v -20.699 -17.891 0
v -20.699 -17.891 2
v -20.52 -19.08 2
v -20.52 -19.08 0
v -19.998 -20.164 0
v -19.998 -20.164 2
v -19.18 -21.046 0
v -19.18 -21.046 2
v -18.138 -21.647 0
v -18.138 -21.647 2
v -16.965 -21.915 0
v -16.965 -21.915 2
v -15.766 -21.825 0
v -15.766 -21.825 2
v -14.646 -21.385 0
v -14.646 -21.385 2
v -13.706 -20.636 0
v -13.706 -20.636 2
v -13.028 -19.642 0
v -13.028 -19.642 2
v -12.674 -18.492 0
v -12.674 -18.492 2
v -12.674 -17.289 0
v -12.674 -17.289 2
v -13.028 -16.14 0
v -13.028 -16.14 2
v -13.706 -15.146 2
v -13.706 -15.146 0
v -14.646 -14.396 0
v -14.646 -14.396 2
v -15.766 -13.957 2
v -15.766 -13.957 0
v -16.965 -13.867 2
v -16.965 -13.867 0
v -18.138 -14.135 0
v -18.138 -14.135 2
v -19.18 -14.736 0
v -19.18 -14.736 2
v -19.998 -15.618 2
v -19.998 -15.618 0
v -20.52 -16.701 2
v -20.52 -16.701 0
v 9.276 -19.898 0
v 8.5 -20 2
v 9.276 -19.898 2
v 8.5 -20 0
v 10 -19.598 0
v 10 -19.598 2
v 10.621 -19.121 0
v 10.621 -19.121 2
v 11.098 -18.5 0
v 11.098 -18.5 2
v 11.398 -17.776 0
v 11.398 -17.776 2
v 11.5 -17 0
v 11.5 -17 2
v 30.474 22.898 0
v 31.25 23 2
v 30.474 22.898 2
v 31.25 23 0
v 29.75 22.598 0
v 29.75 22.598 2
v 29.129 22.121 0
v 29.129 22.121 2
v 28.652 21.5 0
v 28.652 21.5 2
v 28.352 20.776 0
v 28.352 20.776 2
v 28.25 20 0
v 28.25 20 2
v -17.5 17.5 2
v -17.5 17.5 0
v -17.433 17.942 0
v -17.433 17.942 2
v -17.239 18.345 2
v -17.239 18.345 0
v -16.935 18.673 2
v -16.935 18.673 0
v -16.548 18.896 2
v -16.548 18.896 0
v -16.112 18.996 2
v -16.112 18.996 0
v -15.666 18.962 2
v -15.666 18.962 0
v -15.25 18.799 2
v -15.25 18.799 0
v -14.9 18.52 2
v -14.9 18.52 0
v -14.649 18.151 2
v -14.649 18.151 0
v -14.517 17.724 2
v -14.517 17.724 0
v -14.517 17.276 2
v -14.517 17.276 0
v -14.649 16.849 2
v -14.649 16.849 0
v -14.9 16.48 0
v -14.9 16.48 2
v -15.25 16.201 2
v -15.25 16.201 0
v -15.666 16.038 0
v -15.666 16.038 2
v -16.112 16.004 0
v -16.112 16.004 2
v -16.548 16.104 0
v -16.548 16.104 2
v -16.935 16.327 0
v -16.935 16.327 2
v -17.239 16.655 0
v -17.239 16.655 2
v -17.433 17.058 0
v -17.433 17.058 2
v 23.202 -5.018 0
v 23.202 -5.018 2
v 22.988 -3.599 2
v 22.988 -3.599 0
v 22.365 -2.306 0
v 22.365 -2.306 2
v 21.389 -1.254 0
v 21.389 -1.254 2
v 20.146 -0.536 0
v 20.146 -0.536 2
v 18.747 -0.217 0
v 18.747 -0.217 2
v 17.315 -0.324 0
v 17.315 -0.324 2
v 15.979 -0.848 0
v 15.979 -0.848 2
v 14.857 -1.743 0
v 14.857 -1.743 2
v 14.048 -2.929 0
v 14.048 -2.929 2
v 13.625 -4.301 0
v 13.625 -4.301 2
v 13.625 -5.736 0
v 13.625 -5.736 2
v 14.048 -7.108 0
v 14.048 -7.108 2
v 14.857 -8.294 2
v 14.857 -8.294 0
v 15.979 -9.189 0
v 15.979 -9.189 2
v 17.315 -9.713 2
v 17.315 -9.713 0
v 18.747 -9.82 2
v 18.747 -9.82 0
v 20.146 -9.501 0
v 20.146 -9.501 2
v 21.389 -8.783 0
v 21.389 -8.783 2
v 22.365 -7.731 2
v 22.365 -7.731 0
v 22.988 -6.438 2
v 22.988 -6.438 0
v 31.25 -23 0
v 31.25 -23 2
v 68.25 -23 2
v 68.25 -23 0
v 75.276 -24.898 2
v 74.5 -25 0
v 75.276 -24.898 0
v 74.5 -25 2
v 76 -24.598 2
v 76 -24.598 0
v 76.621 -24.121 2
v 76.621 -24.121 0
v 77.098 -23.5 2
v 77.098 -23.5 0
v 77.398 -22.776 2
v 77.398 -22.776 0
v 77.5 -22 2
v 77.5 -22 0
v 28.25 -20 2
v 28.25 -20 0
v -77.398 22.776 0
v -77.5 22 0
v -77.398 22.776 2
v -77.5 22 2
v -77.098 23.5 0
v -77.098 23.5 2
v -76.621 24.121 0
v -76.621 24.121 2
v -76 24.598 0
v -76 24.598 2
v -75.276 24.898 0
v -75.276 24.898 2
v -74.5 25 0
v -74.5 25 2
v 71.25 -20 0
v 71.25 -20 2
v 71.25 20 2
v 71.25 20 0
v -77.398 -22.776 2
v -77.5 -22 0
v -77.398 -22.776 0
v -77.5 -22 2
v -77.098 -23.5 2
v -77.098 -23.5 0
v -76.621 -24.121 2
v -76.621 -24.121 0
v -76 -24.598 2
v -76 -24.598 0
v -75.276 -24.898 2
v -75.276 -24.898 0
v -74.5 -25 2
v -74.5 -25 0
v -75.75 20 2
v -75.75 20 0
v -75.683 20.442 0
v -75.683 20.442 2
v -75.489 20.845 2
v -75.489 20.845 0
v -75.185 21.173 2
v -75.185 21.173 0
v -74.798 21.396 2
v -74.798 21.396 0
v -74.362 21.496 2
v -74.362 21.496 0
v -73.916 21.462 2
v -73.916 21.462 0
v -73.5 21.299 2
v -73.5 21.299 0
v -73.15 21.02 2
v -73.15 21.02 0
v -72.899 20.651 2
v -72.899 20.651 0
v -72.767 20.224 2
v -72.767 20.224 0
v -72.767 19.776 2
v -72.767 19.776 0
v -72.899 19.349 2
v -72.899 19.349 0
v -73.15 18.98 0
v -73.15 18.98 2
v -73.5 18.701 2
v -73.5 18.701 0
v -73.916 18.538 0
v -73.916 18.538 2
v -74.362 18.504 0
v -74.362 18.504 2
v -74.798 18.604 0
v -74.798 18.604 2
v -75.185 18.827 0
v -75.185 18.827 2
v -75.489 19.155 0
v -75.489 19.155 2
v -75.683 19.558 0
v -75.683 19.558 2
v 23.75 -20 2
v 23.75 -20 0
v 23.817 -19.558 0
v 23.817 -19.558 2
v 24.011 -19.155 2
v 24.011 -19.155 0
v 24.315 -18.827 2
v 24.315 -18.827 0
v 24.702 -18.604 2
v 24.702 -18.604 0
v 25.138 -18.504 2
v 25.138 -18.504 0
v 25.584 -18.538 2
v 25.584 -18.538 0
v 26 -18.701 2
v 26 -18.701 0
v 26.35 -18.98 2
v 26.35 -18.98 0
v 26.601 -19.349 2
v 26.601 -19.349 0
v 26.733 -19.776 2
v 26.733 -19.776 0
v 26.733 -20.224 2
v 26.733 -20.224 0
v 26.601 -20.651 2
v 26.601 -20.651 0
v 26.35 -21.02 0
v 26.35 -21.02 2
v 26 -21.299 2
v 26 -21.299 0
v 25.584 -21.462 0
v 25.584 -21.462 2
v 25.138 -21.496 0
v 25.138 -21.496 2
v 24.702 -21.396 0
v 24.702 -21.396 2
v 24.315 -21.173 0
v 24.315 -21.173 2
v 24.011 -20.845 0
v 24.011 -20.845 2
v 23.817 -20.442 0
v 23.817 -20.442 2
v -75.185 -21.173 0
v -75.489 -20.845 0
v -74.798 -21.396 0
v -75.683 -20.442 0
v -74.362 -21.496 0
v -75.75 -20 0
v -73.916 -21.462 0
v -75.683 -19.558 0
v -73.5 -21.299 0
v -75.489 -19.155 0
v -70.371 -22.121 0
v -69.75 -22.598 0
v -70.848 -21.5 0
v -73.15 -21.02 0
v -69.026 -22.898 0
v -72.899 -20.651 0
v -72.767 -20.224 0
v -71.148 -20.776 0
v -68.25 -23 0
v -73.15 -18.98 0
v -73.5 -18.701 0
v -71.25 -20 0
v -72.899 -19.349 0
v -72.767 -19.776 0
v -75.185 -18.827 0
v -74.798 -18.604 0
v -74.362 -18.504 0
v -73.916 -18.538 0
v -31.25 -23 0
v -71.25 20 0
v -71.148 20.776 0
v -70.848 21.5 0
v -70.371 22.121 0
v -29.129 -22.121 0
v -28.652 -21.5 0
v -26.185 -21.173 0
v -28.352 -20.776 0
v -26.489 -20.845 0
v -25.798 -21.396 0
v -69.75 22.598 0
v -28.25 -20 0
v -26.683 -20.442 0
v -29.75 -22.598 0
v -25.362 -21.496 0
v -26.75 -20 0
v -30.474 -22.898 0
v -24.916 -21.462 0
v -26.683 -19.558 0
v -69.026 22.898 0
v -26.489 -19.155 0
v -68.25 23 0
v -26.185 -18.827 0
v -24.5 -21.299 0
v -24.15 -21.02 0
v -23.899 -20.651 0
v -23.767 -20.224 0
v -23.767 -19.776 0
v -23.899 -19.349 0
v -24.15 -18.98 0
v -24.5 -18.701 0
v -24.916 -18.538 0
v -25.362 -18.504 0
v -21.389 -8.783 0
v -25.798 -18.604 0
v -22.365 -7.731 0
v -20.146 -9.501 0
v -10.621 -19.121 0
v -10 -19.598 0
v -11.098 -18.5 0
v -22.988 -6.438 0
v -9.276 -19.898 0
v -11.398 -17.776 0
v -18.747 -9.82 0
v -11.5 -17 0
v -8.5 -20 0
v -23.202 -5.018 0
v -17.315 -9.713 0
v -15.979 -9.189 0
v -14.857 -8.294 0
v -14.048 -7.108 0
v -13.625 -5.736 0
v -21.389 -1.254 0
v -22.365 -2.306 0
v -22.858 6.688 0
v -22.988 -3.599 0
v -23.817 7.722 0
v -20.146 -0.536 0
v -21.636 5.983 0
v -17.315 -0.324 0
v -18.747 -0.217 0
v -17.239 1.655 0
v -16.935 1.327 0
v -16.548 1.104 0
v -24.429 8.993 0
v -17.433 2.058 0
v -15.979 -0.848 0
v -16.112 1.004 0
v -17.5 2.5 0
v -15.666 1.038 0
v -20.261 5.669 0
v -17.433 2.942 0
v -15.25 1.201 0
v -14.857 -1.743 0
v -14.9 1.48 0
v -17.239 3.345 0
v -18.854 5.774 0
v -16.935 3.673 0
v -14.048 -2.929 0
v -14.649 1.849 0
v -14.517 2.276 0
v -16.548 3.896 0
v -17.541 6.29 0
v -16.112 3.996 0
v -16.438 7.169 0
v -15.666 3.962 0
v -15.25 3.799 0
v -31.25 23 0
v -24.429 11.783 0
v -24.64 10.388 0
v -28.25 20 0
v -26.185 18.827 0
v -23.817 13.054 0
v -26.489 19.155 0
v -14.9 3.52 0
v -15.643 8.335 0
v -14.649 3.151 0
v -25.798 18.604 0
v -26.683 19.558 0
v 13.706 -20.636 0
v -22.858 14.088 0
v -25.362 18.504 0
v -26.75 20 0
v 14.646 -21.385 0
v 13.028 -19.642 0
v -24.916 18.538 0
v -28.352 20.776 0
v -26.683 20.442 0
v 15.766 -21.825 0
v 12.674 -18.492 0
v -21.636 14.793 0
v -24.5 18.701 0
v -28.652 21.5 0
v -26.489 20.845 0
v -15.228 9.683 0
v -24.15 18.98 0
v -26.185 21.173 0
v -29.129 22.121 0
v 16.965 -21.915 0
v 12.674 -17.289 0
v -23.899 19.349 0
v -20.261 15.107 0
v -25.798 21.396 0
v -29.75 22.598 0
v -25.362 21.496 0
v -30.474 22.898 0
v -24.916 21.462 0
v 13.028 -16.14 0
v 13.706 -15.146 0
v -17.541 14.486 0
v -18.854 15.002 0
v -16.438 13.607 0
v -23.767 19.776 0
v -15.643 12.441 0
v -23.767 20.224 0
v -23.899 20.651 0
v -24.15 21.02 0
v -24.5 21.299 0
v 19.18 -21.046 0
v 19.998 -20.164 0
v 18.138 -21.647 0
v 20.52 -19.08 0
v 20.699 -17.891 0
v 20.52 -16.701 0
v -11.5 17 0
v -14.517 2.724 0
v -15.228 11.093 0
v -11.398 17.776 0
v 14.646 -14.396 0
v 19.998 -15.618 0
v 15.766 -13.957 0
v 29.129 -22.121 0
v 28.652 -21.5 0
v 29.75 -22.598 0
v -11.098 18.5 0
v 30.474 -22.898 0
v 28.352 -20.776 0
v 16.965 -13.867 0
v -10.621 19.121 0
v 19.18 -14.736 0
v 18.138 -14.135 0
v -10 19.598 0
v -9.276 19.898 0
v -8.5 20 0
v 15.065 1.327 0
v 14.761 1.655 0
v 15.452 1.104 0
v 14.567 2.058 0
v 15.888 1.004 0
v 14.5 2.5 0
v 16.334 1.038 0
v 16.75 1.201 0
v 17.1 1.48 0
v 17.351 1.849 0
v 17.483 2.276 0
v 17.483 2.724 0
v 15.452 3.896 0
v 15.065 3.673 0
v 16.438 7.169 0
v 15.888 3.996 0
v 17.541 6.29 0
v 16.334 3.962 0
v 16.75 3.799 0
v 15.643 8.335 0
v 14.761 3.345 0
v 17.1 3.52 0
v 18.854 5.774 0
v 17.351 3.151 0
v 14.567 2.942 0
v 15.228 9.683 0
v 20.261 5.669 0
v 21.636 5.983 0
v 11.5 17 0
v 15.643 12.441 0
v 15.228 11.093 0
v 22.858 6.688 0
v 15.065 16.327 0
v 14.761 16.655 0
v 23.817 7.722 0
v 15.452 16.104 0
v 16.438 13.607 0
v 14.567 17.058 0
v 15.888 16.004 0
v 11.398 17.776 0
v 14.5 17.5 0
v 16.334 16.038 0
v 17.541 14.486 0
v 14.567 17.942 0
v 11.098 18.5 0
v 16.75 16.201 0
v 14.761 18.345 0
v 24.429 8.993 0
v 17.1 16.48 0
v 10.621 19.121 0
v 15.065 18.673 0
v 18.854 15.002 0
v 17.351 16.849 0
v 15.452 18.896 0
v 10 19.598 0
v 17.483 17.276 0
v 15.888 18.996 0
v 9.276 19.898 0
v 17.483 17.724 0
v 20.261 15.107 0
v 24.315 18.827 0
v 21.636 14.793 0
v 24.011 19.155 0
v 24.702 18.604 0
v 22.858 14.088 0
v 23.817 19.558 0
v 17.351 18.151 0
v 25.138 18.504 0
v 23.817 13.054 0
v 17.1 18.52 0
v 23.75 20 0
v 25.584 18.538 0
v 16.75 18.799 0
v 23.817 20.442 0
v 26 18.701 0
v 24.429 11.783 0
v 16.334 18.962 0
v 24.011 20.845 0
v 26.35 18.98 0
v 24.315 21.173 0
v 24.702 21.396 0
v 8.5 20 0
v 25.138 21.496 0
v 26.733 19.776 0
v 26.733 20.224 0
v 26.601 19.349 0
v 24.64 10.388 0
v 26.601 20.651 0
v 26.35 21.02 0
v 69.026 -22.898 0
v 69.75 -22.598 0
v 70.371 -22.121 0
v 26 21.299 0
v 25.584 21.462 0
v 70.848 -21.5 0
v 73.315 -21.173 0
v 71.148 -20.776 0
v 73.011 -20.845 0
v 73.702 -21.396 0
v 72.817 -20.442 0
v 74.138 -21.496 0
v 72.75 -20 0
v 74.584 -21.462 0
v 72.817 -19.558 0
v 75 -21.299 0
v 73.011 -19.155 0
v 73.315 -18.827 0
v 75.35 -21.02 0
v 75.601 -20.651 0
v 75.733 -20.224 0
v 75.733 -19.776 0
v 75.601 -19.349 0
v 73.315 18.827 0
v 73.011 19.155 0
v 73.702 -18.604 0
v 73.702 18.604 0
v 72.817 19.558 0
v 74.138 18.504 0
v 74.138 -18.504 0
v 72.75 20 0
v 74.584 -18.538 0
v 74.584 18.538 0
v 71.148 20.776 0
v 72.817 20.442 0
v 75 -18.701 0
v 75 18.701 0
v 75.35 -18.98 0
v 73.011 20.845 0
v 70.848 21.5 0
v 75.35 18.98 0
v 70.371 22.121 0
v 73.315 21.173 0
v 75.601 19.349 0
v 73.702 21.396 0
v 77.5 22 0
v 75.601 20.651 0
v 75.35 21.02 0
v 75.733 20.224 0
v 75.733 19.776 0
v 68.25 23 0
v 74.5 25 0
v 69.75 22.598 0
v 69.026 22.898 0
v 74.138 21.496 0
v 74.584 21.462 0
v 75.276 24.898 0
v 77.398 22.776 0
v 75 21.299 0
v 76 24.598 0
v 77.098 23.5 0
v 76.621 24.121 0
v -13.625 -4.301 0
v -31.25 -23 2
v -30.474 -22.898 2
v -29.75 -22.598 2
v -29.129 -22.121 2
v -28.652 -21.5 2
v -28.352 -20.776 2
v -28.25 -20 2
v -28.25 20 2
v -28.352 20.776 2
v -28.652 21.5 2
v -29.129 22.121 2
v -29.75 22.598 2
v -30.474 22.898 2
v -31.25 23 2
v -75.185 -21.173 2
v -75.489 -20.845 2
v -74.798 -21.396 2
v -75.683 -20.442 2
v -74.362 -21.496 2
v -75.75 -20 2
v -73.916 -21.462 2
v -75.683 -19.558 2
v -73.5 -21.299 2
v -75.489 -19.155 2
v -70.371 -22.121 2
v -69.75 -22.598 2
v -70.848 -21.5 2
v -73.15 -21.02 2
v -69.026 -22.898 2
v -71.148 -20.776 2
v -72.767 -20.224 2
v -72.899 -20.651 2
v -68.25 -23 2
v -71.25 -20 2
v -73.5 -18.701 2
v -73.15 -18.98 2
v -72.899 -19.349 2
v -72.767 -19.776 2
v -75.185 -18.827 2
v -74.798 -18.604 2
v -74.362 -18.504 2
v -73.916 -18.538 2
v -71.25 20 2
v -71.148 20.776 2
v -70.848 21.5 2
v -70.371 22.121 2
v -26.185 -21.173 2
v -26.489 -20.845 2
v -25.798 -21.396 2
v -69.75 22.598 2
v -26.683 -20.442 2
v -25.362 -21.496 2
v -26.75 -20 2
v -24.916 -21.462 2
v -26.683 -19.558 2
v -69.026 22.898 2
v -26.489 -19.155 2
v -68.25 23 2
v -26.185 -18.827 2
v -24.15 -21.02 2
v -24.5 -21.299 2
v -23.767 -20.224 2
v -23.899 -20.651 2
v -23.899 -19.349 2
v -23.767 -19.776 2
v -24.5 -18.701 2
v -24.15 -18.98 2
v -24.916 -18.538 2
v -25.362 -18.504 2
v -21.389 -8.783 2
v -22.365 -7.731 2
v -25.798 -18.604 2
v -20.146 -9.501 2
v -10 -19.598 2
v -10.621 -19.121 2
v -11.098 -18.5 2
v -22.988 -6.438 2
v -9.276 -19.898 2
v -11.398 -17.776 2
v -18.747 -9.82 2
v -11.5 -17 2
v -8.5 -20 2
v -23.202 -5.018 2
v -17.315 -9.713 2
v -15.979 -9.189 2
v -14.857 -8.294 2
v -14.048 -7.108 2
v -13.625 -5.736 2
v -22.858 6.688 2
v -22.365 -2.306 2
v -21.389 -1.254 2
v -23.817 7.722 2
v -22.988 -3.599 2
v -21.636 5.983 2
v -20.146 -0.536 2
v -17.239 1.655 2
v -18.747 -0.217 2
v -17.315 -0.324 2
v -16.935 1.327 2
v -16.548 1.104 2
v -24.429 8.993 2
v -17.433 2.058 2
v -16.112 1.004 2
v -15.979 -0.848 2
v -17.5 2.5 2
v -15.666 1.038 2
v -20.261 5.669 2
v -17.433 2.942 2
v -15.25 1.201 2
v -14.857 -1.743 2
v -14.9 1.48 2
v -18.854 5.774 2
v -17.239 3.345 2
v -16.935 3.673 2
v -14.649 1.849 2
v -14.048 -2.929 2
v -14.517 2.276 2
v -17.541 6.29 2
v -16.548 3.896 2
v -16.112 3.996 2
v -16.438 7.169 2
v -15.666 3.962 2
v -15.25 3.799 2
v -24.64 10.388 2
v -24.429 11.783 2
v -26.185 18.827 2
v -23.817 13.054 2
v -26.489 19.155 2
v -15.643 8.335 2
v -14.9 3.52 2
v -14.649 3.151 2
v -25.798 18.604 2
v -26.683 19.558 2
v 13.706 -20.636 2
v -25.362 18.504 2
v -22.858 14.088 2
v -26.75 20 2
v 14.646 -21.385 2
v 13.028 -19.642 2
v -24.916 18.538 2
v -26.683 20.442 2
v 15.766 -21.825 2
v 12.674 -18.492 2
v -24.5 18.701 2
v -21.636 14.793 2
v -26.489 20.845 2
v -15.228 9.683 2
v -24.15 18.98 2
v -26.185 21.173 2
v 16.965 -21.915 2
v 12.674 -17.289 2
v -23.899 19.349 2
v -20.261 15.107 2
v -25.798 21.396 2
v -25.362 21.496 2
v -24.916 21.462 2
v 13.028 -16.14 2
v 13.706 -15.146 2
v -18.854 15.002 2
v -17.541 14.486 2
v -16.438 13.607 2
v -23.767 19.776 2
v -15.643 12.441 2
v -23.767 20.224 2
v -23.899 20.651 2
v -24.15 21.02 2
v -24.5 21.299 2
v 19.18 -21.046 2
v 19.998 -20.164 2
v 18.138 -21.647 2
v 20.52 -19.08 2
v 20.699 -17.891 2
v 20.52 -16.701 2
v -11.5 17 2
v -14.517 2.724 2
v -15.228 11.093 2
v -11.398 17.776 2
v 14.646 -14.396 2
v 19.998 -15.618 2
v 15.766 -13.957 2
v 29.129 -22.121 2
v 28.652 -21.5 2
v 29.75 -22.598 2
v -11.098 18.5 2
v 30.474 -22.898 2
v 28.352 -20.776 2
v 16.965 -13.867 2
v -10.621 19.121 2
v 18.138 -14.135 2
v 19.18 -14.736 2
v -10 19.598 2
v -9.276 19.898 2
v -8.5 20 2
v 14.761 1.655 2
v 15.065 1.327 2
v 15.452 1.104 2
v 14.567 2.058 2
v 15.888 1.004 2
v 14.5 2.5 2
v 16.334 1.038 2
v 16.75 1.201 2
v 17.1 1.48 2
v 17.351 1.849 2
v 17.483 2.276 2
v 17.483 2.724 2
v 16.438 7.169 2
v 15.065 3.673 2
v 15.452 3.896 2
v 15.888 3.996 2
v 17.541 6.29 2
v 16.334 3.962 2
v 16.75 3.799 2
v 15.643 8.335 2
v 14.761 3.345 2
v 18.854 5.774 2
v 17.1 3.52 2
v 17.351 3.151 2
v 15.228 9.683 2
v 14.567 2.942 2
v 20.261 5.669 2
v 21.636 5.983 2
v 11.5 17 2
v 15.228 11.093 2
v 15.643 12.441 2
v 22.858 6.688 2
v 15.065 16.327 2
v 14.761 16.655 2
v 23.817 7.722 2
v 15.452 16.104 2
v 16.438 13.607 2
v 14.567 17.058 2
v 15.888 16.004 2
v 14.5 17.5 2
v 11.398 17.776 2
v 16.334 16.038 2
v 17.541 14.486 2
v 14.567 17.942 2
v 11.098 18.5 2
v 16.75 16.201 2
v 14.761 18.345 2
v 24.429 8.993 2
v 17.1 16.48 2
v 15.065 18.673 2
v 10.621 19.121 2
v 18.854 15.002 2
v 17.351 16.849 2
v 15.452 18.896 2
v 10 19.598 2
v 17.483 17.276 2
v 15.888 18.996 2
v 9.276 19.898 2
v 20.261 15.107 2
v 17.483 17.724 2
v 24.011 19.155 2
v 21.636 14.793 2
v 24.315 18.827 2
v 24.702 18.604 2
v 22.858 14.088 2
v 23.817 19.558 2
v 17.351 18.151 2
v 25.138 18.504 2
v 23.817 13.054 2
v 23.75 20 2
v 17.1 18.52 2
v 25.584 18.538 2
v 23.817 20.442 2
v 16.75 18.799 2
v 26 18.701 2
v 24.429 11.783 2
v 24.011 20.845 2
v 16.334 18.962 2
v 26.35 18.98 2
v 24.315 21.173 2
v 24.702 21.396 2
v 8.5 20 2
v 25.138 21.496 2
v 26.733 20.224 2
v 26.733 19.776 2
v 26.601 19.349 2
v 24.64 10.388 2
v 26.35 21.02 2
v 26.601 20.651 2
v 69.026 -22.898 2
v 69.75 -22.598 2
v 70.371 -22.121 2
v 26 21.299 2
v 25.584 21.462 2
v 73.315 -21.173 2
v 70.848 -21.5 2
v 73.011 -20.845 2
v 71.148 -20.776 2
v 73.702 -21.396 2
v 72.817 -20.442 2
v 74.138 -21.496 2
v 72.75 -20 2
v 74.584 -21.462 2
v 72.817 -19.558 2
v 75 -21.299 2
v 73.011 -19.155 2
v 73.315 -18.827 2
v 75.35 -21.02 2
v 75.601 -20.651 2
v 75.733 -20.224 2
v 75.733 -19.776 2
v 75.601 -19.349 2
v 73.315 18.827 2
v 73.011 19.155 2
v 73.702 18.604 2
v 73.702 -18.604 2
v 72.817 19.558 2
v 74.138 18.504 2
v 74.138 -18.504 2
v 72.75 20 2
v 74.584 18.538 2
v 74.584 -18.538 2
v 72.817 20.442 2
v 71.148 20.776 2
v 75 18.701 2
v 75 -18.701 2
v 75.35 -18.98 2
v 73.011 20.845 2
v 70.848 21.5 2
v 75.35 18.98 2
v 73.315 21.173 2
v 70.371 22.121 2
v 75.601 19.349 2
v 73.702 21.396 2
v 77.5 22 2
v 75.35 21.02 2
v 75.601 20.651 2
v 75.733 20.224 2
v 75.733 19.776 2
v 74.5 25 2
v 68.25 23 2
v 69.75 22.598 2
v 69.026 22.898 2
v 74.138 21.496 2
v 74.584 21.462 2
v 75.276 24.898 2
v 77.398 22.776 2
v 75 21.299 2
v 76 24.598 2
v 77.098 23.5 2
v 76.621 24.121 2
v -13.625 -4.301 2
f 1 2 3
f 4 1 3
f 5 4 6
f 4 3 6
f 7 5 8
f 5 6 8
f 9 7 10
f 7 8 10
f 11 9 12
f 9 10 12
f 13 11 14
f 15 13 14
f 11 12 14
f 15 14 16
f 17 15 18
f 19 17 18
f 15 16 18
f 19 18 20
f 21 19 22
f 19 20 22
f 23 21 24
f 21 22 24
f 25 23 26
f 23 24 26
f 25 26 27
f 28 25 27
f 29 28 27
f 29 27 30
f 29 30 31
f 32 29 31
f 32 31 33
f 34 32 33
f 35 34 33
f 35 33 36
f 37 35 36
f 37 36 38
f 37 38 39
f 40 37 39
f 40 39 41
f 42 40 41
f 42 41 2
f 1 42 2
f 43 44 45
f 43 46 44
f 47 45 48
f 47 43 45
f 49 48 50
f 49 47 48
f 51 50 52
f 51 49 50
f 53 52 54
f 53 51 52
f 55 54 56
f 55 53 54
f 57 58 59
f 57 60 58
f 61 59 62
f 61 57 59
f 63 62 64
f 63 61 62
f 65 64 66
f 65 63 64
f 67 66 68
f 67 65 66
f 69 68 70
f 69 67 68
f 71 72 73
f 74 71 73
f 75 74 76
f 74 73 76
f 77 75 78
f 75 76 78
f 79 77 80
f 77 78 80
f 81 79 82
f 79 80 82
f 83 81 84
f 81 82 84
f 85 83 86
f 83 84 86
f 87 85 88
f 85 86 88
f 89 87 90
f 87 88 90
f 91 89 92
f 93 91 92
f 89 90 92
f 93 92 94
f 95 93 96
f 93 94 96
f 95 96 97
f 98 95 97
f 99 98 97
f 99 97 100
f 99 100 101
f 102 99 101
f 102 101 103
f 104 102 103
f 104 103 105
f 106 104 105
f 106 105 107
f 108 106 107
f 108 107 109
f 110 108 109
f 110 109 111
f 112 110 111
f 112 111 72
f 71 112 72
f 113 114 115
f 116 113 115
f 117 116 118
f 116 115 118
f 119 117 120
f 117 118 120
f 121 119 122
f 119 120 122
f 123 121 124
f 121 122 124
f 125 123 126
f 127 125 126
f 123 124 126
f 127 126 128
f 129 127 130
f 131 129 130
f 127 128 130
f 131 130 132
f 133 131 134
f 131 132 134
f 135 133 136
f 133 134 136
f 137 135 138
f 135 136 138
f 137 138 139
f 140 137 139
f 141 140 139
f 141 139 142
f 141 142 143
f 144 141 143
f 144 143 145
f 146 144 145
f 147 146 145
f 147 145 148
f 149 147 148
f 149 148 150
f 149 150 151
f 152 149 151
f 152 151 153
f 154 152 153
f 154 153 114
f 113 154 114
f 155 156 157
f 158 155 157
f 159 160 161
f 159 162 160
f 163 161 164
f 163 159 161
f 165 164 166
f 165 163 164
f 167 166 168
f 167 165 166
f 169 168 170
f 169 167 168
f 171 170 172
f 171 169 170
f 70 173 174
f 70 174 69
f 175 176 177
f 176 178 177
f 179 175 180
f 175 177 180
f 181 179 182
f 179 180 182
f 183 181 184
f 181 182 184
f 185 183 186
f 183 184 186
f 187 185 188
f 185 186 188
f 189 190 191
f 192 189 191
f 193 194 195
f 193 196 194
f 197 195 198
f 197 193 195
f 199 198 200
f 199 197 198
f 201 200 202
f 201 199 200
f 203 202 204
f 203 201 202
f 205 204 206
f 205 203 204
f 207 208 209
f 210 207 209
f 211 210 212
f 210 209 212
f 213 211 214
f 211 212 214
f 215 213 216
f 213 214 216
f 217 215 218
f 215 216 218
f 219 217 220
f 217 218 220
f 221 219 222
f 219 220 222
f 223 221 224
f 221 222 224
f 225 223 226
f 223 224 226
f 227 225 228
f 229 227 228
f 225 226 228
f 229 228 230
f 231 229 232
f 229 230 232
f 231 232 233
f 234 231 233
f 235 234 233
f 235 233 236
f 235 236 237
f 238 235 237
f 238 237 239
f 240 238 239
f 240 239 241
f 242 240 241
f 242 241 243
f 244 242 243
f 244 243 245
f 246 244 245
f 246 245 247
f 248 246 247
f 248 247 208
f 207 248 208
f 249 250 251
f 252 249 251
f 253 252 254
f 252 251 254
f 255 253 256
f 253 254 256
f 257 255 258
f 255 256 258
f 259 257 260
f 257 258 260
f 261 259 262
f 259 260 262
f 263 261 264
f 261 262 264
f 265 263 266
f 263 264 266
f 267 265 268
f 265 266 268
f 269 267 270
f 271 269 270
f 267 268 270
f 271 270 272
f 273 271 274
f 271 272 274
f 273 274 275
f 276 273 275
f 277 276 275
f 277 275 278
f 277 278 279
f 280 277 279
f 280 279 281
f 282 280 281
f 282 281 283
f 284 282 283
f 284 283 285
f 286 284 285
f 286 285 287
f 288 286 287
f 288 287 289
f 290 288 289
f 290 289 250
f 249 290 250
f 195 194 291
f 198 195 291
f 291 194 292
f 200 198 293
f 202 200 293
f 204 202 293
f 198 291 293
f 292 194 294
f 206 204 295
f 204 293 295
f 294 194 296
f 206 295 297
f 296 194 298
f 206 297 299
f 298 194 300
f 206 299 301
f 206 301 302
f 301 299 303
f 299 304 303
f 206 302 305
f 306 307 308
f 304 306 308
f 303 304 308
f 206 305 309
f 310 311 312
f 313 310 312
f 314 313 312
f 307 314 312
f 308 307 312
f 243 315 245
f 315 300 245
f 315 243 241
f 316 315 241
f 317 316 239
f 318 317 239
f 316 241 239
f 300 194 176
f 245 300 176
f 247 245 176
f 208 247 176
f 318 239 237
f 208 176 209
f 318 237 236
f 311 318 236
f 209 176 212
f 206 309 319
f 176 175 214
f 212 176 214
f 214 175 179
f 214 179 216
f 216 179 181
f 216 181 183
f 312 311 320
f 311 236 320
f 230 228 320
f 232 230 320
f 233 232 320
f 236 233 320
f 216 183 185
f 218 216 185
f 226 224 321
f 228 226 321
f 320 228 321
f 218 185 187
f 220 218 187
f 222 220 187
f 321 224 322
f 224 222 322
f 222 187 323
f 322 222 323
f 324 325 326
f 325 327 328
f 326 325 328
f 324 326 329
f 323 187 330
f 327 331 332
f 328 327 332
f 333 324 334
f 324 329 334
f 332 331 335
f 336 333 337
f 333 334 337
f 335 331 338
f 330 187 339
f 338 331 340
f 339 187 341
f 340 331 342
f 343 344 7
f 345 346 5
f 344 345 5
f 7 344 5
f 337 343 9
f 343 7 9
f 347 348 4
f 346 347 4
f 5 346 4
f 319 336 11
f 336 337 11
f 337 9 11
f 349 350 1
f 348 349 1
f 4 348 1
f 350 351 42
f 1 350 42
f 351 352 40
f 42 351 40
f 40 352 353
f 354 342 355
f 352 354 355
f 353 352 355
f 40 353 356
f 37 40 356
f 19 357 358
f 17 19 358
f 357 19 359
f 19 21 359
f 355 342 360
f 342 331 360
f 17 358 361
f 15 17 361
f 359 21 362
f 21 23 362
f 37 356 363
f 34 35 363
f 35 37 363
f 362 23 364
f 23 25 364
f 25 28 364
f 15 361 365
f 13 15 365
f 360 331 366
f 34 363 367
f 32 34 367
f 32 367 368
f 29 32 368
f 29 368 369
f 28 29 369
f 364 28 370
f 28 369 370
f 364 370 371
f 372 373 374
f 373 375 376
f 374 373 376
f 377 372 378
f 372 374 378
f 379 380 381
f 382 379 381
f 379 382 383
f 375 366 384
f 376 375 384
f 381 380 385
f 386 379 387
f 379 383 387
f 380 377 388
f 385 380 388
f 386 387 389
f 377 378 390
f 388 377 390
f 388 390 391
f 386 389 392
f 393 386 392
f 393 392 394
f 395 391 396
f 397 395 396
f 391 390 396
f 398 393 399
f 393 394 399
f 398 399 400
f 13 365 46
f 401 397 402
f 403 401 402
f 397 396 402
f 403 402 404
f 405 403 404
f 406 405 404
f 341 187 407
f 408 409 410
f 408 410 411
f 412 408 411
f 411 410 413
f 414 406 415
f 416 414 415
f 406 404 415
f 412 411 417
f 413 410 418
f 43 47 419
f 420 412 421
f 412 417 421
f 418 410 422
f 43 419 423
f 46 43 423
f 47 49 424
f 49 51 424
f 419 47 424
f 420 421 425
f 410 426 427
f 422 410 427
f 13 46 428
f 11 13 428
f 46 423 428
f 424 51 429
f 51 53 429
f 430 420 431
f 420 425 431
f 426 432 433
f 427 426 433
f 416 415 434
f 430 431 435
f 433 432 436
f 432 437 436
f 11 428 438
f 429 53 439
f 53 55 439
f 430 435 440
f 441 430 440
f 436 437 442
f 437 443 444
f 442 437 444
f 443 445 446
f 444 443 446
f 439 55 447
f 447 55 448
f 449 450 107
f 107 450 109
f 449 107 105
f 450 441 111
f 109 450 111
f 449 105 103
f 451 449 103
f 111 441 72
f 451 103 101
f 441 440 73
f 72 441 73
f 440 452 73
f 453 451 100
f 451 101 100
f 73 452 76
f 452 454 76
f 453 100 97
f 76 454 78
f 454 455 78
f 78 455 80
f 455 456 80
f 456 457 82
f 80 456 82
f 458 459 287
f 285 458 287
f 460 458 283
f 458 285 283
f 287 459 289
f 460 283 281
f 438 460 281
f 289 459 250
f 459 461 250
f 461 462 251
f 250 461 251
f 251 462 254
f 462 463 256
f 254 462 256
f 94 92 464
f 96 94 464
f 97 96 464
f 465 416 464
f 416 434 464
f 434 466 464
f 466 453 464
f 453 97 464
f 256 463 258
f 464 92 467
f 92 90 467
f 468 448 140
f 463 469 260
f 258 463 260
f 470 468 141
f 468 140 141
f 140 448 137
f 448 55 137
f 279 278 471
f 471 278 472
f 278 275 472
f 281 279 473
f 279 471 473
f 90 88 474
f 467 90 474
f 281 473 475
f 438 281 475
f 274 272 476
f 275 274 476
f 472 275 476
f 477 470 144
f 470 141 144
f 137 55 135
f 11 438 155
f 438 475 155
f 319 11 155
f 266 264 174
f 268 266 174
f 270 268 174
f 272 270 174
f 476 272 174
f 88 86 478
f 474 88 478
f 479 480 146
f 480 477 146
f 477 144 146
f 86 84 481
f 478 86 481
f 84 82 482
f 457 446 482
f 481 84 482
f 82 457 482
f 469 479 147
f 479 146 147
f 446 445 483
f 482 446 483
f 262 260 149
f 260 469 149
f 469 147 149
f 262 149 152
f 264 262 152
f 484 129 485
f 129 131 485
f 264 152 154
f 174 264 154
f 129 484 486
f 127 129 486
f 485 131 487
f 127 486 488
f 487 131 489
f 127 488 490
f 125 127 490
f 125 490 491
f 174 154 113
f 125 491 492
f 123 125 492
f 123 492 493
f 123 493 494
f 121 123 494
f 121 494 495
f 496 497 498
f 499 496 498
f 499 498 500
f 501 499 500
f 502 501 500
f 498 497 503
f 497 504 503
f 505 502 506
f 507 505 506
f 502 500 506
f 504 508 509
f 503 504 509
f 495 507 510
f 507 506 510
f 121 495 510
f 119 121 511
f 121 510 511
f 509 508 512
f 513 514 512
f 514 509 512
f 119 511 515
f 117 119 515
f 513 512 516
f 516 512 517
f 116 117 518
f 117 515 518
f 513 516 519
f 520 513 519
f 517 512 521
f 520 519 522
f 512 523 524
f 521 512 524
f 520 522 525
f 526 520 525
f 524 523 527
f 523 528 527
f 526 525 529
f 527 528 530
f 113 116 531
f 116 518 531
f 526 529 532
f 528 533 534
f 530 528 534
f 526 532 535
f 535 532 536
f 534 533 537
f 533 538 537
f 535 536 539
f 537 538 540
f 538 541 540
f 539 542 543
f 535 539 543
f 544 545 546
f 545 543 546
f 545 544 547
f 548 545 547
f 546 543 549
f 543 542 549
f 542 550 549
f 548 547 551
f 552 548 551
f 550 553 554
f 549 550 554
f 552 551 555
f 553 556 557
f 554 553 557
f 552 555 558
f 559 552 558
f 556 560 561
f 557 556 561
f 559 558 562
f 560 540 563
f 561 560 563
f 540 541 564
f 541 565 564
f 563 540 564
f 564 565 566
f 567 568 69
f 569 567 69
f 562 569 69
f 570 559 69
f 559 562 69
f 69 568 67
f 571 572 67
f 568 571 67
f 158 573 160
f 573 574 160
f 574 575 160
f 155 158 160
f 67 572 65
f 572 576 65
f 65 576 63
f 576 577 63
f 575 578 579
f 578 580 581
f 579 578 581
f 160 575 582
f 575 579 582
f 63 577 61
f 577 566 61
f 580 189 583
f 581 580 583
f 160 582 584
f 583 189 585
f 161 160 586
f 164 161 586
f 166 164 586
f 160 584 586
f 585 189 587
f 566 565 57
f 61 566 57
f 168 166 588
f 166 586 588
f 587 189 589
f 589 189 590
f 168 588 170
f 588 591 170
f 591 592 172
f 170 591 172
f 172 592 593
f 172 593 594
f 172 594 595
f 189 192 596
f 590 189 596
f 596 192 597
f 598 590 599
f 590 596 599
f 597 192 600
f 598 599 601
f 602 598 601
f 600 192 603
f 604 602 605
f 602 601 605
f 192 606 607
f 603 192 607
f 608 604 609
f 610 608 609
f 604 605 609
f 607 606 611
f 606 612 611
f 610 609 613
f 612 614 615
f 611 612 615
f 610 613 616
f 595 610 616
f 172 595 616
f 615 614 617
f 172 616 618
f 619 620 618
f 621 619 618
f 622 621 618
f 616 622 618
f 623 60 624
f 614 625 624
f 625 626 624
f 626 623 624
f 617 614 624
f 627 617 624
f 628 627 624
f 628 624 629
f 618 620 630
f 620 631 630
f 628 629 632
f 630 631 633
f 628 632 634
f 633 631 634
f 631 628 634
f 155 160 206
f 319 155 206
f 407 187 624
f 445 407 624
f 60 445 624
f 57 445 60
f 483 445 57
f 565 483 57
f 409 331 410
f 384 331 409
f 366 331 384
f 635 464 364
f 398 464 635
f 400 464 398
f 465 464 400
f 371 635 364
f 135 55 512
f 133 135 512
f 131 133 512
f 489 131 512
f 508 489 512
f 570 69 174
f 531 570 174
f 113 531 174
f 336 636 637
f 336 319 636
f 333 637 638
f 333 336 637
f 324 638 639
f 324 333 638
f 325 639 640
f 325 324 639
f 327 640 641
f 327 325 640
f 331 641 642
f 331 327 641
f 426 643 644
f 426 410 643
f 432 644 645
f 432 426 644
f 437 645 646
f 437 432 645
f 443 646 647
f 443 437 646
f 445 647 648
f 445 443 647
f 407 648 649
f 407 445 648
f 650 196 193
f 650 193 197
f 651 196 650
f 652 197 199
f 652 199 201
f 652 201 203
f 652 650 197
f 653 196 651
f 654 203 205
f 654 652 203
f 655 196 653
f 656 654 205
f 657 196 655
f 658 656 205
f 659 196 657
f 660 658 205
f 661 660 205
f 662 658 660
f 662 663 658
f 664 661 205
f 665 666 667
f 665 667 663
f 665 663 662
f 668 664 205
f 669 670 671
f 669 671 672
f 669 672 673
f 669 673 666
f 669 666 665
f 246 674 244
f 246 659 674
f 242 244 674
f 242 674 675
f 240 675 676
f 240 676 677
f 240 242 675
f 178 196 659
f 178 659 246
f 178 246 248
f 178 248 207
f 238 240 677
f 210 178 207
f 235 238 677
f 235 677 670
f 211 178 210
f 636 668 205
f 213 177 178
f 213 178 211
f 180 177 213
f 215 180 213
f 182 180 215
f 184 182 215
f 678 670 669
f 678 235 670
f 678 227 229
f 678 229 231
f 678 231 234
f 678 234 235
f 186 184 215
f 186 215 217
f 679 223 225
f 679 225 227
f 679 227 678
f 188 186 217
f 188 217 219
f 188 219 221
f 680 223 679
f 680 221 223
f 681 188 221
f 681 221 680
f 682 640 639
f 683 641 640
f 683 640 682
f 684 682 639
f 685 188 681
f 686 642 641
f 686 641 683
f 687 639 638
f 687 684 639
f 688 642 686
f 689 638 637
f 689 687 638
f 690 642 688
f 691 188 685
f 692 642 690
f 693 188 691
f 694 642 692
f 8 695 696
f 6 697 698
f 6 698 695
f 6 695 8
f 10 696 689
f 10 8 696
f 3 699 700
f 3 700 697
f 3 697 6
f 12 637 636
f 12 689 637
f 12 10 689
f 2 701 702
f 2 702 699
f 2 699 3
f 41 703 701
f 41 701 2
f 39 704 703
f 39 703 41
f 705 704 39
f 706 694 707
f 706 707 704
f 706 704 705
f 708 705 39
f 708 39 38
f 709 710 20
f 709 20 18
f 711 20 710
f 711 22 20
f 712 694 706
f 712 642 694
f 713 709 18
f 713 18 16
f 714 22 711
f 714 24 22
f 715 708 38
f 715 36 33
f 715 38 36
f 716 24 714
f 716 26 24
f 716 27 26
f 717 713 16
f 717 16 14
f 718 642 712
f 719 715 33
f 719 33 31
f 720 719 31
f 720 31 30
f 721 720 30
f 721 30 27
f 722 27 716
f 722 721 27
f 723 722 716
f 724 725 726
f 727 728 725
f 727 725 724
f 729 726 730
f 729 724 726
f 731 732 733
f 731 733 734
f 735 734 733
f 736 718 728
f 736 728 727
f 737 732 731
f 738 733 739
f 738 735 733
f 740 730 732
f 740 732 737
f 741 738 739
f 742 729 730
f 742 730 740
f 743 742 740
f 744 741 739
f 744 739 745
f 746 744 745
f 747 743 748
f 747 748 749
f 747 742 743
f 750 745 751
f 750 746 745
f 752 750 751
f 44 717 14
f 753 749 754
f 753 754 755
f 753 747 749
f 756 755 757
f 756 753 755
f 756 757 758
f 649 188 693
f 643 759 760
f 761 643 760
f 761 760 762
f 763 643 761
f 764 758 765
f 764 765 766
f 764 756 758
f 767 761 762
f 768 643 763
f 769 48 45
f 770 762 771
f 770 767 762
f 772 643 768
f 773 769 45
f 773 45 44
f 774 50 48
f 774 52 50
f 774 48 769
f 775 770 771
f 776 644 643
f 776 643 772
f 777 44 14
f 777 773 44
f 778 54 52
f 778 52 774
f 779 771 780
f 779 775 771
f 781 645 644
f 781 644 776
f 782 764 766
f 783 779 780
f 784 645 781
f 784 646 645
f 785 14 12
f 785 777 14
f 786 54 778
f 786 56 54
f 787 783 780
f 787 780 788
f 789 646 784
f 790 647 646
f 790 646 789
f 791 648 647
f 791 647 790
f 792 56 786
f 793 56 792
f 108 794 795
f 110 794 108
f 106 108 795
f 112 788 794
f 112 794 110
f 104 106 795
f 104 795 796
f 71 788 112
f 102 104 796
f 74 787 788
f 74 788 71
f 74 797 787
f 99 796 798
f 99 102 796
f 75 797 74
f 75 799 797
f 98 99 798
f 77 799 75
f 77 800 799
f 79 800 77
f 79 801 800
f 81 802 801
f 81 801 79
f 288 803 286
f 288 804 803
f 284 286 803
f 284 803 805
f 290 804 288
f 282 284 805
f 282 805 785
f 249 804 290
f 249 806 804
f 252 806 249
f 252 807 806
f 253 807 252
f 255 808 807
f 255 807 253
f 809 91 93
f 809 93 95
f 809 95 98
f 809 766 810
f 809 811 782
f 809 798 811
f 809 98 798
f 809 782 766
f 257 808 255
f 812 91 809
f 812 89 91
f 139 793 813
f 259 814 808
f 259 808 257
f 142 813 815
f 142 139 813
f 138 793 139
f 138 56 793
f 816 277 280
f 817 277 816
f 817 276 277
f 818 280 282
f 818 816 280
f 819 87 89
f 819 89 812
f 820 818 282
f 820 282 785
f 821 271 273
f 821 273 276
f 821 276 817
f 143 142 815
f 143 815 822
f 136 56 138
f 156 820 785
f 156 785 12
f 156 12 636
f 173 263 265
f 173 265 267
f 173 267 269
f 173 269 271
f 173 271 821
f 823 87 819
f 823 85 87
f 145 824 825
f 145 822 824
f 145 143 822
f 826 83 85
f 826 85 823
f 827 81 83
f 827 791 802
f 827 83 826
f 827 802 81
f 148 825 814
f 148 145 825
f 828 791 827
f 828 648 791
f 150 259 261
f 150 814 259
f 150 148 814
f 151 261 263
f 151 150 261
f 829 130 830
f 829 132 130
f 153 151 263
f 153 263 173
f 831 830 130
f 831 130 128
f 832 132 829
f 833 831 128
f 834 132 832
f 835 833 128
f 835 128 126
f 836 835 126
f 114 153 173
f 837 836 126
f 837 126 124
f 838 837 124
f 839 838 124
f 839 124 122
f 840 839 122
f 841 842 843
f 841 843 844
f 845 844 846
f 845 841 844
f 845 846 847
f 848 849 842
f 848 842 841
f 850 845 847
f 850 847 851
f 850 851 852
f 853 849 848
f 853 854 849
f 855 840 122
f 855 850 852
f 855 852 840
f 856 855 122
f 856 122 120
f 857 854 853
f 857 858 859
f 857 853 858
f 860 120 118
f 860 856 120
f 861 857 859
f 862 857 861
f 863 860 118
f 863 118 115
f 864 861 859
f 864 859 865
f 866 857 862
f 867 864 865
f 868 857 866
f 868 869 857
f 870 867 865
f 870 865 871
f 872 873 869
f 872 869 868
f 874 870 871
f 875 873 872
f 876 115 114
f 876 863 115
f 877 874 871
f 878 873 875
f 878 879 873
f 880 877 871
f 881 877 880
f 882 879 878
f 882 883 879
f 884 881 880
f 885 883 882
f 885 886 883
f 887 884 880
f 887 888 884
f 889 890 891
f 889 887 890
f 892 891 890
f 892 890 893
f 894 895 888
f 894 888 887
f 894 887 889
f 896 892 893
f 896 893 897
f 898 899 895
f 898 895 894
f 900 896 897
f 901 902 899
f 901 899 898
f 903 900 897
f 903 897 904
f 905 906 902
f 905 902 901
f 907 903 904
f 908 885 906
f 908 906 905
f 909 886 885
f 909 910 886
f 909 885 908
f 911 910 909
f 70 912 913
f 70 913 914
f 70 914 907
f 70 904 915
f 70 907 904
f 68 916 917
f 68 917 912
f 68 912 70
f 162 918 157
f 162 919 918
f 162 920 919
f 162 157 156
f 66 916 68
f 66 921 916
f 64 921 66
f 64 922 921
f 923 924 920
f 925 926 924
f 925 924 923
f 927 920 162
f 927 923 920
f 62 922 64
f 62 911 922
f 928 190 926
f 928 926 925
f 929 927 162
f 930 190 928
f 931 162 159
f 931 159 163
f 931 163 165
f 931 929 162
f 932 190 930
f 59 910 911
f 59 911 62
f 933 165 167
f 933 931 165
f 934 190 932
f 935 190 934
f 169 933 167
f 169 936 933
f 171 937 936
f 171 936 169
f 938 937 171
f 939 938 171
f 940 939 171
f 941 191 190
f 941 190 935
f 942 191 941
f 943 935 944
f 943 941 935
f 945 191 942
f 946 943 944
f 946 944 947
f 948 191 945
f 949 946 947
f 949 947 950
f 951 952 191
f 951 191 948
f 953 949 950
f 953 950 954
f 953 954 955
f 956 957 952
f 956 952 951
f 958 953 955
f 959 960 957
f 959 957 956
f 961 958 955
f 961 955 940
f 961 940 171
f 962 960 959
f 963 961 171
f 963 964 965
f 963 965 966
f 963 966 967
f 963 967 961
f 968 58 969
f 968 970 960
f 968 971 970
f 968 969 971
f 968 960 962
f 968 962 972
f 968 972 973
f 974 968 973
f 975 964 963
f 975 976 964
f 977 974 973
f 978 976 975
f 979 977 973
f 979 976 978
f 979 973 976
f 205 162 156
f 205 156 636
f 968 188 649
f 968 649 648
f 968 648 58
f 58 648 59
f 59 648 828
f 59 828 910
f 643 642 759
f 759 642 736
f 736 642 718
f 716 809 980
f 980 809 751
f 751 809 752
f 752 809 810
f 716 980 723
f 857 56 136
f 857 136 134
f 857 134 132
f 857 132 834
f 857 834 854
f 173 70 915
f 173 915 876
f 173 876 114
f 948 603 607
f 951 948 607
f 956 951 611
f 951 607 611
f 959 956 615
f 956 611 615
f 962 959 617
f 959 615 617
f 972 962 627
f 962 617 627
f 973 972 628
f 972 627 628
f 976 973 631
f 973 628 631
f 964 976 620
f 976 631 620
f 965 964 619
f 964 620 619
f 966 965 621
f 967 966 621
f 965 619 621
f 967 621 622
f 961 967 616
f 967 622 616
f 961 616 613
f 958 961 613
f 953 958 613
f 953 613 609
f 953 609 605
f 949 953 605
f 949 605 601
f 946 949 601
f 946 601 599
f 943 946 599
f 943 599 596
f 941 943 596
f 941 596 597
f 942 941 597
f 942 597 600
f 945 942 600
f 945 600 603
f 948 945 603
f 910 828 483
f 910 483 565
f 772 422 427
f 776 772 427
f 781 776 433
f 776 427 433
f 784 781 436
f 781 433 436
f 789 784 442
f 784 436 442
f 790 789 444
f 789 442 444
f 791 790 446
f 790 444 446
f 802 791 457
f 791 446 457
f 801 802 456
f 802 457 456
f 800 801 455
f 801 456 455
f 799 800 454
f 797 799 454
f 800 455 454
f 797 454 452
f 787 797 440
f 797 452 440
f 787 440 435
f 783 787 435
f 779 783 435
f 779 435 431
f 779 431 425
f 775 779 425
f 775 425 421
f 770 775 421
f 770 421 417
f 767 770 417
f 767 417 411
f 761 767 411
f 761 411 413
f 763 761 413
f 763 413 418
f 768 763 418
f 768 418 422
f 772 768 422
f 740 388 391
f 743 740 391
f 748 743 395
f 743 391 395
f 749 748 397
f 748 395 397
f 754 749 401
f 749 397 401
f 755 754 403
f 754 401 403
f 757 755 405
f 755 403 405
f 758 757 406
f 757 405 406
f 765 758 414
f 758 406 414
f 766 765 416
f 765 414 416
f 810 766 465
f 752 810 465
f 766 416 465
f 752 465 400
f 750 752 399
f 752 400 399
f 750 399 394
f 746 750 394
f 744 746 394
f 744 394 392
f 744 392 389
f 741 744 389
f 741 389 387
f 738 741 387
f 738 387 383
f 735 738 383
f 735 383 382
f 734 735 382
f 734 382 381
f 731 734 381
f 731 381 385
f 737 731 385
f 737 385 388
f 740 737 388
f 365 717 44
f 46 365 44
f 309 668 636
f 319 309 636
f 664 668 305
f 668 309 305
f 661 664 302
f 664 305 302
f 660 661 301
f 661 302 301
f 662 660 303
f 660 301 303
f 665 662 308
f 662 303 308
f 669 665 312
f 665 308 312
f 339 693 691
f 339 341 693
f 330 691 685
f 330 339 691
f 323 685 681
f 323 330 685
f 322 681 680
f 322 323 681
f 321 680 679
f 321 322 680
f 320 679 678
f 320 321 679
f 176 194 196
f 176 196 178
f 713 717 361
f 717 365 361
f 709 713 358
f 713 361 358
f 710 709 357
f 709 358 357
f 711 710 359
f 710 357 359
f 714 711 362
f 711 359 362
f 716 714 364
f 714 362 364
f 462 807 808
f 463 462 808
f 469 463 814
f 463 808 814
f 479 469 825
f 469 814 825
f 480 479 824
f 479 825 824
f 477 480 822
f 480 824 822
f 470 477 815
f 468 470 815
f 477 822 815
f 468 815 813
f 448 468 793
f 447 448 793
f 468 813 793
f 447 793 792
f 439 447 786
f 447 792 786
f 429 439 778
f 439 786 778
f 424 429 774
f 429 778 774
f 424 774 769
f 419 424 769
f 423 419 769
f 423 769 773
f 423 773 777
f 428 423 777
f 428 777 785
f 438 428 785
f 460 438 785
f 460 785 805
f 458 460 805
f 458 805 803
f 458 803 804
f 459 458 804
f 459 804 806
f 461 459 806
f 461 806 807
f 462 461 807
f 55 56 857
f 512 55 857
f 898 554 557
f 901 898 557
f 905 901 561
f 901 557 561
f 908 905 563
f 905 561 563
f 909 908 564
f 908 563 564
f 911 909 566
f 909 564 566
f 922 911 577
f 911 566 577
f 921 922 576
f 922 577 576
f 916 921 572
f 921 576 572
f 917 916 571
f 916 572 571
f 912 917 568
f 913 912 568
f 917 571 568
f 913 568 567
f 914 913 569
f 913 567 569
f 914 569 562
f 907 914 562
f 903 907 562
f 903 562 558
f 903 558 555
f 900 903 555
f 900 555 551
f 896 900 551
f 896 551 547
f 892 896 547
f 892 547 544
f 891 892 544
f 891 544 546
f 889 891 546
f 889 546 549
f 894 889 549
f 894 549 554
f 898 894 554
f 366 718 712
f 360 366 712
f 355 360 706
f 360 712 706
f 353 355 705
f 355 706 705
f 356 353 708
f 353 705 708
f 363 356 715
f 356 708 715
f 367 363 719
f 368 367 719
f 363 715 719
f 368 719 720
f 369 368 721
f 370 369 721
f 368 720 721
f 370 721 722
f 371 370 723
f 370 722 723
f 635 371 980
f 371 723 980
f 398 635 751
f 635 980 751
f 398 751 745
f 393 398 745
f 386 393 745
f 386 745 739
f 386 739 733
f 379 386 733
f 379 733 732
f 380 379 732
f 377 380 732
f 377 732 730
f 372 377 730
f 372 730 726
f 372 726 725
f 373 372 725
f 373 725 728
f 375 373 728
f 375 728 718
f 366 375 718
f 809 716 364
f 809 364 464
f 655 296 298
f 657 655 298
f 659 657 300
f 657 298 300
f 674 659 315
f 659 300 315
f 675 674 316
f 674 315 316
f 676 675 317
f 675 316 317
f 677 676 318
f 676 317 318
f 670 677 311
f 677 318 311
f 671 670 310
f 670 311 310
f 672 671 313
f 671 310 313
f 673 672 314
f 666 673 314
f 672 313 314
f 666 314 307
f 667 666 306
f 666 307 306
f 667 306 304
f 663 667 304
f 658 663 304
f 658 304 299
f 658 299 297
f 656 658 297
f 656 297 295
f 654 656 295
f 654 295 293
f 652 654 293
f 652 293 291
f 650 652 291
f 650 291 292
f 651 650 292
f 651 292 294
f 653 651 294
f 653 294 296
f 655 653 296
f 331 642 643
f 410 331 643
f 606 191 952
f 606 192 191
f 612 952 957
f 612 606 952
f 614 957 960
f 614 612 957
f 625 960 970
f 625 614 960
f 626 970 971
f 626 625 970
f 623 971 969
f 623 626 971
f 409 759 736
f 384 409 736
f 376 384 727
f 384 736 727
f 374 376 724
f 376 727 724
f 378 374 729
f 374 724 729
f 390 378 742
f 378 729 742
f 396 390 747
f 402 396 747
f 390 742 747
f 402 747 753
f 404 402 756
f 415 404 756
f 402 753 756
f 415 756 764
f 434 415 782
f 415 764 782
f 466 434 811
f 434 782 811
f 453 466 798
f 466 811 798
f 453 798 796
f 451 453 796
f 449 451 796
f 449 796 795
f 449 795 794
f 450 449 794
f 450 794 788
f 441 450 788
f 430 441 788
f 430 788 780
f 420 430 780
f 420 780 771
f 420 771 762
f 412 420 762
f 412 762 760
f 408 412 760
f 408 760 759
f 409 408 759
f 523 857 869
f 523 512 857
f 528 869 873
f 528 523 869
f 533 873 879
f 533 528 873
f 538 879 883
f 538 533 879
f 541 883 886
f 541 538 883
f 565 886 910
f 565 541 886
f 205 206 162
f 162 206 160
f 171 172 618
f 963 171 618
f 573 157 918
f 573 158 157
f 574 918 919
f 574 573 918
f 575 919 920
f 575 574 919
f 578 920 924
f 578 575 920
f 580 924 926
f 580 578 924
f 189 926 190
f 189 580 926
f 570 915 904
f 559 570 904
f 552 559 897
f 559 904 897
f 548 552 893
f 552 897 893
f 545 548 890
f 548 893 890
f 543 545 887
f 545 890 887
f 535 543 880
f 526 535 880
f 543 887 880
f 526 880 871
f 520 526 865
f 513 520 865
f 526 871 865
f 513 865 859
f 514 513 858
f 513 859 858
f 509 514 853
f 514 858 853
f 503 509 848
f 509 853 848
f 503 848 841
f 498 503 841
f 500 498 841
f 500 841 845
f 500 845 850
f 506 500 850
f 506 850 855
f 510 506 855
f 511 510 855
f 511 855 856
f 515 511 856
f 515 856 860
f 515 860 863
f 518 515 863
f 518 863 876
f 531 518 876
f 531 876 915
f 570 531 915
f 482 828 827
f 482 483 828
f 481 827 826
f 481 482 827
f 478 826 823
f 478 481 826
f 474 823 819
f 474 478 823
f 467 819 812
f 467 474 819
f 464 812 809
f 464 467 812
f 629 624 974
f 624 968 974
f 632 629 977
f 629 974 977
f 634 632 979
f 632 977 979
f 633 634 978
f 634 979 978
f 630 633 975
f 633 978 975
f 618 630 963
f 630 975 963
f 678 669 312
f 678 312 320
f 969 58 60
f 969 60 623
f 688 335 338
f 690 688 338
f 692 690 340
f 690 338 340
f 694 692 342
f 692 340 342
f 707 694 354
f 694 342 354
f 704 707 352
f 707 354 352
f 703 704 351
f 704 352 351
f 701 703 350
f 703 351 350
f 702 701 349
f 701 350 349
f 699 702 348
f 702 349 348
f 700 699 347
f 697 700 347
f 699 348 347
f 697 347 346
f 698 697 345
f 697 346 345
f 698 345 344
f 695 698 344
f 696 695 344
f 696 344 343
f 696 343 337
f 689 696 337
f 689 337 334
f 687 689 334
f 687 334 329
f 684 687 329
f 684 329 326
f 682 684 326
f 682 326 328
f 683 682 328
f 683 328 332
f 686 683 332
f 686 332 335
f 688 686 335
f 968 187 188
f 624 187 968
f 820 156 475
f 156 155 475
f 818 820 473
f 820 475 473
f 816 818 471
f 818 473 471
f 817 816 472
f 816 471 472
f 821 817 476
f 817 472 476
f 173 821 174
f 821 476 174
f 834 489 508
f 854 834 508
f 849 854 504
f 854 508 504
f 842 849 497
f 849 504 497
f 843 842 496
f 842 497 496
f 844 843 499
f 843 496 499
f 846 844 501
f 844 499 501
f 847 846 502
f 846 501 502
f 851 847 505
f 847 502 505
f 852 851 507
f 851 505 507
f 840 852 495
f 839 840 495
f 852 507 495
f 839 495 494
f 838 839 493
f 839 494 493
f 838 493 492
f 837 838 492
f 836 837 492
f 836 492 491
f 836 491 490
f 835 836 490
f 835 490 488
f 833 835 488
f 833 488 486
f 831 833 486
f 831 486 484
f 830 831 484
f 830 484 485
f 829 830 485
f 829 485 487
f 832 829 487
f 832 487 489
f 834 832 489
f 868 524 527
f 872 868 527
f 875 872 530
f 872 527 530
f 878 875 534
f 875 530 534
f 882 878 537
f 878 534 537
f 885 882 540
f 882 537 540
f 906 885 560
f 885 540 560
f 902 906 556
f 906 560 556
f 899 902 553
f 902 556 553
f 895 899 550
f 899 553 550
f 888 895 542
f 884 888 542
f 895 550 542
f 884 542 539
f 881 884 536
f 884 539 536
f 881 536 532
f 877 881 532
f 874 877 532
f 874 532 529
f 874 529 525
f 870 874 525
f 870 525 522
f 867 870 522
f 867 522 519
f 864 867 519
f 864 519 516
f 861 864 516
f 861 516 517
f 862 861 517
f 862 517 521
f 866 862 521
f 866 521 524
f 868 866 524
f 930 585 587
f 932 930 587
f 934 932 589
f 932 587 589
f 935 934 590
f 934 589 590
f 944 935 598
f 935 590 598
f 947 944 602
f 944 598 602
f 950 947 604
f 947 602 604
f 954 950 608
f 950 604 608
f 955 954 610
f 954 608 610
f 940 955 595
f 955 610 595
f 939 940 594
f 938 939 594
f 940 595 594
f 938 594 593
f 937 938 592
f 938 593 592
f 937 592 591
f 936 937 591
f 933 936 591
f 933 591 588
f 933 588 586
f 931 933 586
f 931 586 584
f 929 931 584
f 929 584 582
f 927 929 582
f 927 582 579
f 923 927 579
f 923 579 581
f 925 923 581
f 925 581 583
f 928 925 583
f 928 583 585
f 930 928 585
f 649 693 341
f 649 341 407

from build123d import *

# Parameters (mm, degrees)
SKETCH_1_W          = 155
SKETCH_1_H          = 50
EXTRUDE_1_DEPTH     = 2
SKETCH_2_R          = 1.5
CUT_EXTRUDE_1_DEPTH = 10
FILLET_1_R          = 3
SKETCH_3_W          = 43
SKETCH_3_H          = 46
CUT_EXTRUDE_2_DEPTH = 10
FILLET_2_R          = 3
SKETCH_4_W          = 23
SKETCH_4_H          = 40
CUT_EXTRUDE_3_DEPTH = 10
FILLET_3_R          = 3
SKETCH_5_R          = 4.732430395
SKETCH_5_R_2        = 4.815282463
SKETCH_5_R_3        = 4.035251629
CUT_EXTRUDE_4_DEPTH = 10


with BuildPart() as part:
    # 草图1 → 凸台-拉伸1 (new body)
    with BuildSketch(Plane.XY):
        Rectangle(SKETCH_1_W, SKETCH_1_H)
    extrude(amount=EXTRUDE_1_DEPTH)

    # 草图2 → 切除-拉伸1 (cut)
    with BuildSketch(Plane(origin=(0, 0, 0), x_dir=(-1, 0, 0), z_dir=(0, 0, -1))):
        with Locations((-25.25, -20)):
            Circle(SKETCH_2_R)
        with Locations((-74.25, -20)):
            Circle(SKETCH_2_R)
        with Locations((-25.25, 20)):
            Circle(SKETCH_2_R)
        with Locations((-74.25, 20)):
            Circle(SKETCH_2_R)
        with Locations((25.25, -20)):
            Circle(SKETCH_2_R)
        with Locations((74.25, -20)):
            Circle(SKETCH_2_R)
        with Locations((25.25, 20)):
            Circle(SKETCH_2_R)
        with Locations((74.25, 20)):
            Circle(SKETCH_2_R)
        with Locations((16, 2.5)):
            Circle(SKETCH_2_R)
        with Locations((16, 17.5)):
            Circle(SKETCH_2_R)
        with Locations((-16, 2.5)):
            Circle(SKETCH_2_R)
        with Locations((-16, 17.5)):
            Circle(SKETCH_2_R)
    extrude(amount=-CUT_EXTRUDE_1_DEPTH, mode=Mode.SUBTRACT)

    # 圆角1
    fillet_1_edges = [part.edges().sort_by_distance(p)[0] for p in [
        (77.5, -25, 1),
        (-77.5, -25, 1),
        (-77.5, 25, 1),
        (77.5, 25, 1),
    ]]
    fillet(fillet_1_edges, radius=FILLET_1_R)

    # 草图3 → 切除-拉伸2 (cut)
    with BuildSketch(Plane.XY.offset(2)):
        with Locations((49.75, 0)):
            Rectangle(SKETCH_3_W, SKETCH_3_H)
        with Locations((-49.75, 0)):
            Rectangle(SKETCH_3_W, SKETCH_3_H)
    extrude(amount=-CUT_EXTRUDE_2_DEPTH, mode=Mode.SUBTRACT)

    # 圆角2
    fillet_2_edges = [part.edges().sort_by_distance(p)[0] for p in [
        (71.25, 23, 1),
        (71.25, -23, 1),
        (28.25, -23, 1),
        (28.25, 23, 1),
        (-28.25, 23, 1),
        (-28.25, -23, 1),
        (-71.25, -23, 1),
        (-71.25, 23, 1),
    ]]
    fillet(fillet_2_edges, radius=FILLET_2_R)

    # 草图4 → 切除-拉伸3 (cut)
    with BuildSketch(Plane.XY.offset(2)):
        Rectangle(SKETCH_4_W, SKETCH_4_H)
    extrude(amount=-CUT_EXTRUDE_3_DEPTH, mode=Mode.SUBTRACT)

    # 圆角3
    fillet_3_edges = [part.edges().sort_by_distance(p)[0] for p in [
        (11.5, 20, 1),
        (11.5, -20, 1),
        (-11.5, -20, 1),
        (-11.5, 20, 1),
    ]]
    fillet(fillet_3_edges, radius=FILLET_3_R)

    # 草图5 → 切除-拉伸4 (cut)
    with BuildSketch(Plane.XY.offset(2)):
        with Locations((19.907240007, 10.387913302)):
            Circle(SKETCH_5_R)
        with Locations((18.386877163, -5.018430181)):
            Circle(SKETCH_5_R_2)
        with Locations((16.663799274, -17.890835592)):
            Circle(SKETCH_5_R_3)
        with Locations(Location((-16.663799274, -17.890835592, 0), (0, 0, 180))):
            Circle(SKETCH_5_R_3)
        with Locations(Location((-18.386877163, -5.018430181, 0), (0, 0, 180))):
            Circle(SKETCH_5_R_2)
        with Locations(Location((-19.907240007, 10.387913302, 0), (0, 0, 180))):
            Circle(SKETCH_5_R)
    extrude(amount=-CUT_EXTRUDE_4_DEPTH, mode=Mode.SUBTRACT)


solid = part.part
